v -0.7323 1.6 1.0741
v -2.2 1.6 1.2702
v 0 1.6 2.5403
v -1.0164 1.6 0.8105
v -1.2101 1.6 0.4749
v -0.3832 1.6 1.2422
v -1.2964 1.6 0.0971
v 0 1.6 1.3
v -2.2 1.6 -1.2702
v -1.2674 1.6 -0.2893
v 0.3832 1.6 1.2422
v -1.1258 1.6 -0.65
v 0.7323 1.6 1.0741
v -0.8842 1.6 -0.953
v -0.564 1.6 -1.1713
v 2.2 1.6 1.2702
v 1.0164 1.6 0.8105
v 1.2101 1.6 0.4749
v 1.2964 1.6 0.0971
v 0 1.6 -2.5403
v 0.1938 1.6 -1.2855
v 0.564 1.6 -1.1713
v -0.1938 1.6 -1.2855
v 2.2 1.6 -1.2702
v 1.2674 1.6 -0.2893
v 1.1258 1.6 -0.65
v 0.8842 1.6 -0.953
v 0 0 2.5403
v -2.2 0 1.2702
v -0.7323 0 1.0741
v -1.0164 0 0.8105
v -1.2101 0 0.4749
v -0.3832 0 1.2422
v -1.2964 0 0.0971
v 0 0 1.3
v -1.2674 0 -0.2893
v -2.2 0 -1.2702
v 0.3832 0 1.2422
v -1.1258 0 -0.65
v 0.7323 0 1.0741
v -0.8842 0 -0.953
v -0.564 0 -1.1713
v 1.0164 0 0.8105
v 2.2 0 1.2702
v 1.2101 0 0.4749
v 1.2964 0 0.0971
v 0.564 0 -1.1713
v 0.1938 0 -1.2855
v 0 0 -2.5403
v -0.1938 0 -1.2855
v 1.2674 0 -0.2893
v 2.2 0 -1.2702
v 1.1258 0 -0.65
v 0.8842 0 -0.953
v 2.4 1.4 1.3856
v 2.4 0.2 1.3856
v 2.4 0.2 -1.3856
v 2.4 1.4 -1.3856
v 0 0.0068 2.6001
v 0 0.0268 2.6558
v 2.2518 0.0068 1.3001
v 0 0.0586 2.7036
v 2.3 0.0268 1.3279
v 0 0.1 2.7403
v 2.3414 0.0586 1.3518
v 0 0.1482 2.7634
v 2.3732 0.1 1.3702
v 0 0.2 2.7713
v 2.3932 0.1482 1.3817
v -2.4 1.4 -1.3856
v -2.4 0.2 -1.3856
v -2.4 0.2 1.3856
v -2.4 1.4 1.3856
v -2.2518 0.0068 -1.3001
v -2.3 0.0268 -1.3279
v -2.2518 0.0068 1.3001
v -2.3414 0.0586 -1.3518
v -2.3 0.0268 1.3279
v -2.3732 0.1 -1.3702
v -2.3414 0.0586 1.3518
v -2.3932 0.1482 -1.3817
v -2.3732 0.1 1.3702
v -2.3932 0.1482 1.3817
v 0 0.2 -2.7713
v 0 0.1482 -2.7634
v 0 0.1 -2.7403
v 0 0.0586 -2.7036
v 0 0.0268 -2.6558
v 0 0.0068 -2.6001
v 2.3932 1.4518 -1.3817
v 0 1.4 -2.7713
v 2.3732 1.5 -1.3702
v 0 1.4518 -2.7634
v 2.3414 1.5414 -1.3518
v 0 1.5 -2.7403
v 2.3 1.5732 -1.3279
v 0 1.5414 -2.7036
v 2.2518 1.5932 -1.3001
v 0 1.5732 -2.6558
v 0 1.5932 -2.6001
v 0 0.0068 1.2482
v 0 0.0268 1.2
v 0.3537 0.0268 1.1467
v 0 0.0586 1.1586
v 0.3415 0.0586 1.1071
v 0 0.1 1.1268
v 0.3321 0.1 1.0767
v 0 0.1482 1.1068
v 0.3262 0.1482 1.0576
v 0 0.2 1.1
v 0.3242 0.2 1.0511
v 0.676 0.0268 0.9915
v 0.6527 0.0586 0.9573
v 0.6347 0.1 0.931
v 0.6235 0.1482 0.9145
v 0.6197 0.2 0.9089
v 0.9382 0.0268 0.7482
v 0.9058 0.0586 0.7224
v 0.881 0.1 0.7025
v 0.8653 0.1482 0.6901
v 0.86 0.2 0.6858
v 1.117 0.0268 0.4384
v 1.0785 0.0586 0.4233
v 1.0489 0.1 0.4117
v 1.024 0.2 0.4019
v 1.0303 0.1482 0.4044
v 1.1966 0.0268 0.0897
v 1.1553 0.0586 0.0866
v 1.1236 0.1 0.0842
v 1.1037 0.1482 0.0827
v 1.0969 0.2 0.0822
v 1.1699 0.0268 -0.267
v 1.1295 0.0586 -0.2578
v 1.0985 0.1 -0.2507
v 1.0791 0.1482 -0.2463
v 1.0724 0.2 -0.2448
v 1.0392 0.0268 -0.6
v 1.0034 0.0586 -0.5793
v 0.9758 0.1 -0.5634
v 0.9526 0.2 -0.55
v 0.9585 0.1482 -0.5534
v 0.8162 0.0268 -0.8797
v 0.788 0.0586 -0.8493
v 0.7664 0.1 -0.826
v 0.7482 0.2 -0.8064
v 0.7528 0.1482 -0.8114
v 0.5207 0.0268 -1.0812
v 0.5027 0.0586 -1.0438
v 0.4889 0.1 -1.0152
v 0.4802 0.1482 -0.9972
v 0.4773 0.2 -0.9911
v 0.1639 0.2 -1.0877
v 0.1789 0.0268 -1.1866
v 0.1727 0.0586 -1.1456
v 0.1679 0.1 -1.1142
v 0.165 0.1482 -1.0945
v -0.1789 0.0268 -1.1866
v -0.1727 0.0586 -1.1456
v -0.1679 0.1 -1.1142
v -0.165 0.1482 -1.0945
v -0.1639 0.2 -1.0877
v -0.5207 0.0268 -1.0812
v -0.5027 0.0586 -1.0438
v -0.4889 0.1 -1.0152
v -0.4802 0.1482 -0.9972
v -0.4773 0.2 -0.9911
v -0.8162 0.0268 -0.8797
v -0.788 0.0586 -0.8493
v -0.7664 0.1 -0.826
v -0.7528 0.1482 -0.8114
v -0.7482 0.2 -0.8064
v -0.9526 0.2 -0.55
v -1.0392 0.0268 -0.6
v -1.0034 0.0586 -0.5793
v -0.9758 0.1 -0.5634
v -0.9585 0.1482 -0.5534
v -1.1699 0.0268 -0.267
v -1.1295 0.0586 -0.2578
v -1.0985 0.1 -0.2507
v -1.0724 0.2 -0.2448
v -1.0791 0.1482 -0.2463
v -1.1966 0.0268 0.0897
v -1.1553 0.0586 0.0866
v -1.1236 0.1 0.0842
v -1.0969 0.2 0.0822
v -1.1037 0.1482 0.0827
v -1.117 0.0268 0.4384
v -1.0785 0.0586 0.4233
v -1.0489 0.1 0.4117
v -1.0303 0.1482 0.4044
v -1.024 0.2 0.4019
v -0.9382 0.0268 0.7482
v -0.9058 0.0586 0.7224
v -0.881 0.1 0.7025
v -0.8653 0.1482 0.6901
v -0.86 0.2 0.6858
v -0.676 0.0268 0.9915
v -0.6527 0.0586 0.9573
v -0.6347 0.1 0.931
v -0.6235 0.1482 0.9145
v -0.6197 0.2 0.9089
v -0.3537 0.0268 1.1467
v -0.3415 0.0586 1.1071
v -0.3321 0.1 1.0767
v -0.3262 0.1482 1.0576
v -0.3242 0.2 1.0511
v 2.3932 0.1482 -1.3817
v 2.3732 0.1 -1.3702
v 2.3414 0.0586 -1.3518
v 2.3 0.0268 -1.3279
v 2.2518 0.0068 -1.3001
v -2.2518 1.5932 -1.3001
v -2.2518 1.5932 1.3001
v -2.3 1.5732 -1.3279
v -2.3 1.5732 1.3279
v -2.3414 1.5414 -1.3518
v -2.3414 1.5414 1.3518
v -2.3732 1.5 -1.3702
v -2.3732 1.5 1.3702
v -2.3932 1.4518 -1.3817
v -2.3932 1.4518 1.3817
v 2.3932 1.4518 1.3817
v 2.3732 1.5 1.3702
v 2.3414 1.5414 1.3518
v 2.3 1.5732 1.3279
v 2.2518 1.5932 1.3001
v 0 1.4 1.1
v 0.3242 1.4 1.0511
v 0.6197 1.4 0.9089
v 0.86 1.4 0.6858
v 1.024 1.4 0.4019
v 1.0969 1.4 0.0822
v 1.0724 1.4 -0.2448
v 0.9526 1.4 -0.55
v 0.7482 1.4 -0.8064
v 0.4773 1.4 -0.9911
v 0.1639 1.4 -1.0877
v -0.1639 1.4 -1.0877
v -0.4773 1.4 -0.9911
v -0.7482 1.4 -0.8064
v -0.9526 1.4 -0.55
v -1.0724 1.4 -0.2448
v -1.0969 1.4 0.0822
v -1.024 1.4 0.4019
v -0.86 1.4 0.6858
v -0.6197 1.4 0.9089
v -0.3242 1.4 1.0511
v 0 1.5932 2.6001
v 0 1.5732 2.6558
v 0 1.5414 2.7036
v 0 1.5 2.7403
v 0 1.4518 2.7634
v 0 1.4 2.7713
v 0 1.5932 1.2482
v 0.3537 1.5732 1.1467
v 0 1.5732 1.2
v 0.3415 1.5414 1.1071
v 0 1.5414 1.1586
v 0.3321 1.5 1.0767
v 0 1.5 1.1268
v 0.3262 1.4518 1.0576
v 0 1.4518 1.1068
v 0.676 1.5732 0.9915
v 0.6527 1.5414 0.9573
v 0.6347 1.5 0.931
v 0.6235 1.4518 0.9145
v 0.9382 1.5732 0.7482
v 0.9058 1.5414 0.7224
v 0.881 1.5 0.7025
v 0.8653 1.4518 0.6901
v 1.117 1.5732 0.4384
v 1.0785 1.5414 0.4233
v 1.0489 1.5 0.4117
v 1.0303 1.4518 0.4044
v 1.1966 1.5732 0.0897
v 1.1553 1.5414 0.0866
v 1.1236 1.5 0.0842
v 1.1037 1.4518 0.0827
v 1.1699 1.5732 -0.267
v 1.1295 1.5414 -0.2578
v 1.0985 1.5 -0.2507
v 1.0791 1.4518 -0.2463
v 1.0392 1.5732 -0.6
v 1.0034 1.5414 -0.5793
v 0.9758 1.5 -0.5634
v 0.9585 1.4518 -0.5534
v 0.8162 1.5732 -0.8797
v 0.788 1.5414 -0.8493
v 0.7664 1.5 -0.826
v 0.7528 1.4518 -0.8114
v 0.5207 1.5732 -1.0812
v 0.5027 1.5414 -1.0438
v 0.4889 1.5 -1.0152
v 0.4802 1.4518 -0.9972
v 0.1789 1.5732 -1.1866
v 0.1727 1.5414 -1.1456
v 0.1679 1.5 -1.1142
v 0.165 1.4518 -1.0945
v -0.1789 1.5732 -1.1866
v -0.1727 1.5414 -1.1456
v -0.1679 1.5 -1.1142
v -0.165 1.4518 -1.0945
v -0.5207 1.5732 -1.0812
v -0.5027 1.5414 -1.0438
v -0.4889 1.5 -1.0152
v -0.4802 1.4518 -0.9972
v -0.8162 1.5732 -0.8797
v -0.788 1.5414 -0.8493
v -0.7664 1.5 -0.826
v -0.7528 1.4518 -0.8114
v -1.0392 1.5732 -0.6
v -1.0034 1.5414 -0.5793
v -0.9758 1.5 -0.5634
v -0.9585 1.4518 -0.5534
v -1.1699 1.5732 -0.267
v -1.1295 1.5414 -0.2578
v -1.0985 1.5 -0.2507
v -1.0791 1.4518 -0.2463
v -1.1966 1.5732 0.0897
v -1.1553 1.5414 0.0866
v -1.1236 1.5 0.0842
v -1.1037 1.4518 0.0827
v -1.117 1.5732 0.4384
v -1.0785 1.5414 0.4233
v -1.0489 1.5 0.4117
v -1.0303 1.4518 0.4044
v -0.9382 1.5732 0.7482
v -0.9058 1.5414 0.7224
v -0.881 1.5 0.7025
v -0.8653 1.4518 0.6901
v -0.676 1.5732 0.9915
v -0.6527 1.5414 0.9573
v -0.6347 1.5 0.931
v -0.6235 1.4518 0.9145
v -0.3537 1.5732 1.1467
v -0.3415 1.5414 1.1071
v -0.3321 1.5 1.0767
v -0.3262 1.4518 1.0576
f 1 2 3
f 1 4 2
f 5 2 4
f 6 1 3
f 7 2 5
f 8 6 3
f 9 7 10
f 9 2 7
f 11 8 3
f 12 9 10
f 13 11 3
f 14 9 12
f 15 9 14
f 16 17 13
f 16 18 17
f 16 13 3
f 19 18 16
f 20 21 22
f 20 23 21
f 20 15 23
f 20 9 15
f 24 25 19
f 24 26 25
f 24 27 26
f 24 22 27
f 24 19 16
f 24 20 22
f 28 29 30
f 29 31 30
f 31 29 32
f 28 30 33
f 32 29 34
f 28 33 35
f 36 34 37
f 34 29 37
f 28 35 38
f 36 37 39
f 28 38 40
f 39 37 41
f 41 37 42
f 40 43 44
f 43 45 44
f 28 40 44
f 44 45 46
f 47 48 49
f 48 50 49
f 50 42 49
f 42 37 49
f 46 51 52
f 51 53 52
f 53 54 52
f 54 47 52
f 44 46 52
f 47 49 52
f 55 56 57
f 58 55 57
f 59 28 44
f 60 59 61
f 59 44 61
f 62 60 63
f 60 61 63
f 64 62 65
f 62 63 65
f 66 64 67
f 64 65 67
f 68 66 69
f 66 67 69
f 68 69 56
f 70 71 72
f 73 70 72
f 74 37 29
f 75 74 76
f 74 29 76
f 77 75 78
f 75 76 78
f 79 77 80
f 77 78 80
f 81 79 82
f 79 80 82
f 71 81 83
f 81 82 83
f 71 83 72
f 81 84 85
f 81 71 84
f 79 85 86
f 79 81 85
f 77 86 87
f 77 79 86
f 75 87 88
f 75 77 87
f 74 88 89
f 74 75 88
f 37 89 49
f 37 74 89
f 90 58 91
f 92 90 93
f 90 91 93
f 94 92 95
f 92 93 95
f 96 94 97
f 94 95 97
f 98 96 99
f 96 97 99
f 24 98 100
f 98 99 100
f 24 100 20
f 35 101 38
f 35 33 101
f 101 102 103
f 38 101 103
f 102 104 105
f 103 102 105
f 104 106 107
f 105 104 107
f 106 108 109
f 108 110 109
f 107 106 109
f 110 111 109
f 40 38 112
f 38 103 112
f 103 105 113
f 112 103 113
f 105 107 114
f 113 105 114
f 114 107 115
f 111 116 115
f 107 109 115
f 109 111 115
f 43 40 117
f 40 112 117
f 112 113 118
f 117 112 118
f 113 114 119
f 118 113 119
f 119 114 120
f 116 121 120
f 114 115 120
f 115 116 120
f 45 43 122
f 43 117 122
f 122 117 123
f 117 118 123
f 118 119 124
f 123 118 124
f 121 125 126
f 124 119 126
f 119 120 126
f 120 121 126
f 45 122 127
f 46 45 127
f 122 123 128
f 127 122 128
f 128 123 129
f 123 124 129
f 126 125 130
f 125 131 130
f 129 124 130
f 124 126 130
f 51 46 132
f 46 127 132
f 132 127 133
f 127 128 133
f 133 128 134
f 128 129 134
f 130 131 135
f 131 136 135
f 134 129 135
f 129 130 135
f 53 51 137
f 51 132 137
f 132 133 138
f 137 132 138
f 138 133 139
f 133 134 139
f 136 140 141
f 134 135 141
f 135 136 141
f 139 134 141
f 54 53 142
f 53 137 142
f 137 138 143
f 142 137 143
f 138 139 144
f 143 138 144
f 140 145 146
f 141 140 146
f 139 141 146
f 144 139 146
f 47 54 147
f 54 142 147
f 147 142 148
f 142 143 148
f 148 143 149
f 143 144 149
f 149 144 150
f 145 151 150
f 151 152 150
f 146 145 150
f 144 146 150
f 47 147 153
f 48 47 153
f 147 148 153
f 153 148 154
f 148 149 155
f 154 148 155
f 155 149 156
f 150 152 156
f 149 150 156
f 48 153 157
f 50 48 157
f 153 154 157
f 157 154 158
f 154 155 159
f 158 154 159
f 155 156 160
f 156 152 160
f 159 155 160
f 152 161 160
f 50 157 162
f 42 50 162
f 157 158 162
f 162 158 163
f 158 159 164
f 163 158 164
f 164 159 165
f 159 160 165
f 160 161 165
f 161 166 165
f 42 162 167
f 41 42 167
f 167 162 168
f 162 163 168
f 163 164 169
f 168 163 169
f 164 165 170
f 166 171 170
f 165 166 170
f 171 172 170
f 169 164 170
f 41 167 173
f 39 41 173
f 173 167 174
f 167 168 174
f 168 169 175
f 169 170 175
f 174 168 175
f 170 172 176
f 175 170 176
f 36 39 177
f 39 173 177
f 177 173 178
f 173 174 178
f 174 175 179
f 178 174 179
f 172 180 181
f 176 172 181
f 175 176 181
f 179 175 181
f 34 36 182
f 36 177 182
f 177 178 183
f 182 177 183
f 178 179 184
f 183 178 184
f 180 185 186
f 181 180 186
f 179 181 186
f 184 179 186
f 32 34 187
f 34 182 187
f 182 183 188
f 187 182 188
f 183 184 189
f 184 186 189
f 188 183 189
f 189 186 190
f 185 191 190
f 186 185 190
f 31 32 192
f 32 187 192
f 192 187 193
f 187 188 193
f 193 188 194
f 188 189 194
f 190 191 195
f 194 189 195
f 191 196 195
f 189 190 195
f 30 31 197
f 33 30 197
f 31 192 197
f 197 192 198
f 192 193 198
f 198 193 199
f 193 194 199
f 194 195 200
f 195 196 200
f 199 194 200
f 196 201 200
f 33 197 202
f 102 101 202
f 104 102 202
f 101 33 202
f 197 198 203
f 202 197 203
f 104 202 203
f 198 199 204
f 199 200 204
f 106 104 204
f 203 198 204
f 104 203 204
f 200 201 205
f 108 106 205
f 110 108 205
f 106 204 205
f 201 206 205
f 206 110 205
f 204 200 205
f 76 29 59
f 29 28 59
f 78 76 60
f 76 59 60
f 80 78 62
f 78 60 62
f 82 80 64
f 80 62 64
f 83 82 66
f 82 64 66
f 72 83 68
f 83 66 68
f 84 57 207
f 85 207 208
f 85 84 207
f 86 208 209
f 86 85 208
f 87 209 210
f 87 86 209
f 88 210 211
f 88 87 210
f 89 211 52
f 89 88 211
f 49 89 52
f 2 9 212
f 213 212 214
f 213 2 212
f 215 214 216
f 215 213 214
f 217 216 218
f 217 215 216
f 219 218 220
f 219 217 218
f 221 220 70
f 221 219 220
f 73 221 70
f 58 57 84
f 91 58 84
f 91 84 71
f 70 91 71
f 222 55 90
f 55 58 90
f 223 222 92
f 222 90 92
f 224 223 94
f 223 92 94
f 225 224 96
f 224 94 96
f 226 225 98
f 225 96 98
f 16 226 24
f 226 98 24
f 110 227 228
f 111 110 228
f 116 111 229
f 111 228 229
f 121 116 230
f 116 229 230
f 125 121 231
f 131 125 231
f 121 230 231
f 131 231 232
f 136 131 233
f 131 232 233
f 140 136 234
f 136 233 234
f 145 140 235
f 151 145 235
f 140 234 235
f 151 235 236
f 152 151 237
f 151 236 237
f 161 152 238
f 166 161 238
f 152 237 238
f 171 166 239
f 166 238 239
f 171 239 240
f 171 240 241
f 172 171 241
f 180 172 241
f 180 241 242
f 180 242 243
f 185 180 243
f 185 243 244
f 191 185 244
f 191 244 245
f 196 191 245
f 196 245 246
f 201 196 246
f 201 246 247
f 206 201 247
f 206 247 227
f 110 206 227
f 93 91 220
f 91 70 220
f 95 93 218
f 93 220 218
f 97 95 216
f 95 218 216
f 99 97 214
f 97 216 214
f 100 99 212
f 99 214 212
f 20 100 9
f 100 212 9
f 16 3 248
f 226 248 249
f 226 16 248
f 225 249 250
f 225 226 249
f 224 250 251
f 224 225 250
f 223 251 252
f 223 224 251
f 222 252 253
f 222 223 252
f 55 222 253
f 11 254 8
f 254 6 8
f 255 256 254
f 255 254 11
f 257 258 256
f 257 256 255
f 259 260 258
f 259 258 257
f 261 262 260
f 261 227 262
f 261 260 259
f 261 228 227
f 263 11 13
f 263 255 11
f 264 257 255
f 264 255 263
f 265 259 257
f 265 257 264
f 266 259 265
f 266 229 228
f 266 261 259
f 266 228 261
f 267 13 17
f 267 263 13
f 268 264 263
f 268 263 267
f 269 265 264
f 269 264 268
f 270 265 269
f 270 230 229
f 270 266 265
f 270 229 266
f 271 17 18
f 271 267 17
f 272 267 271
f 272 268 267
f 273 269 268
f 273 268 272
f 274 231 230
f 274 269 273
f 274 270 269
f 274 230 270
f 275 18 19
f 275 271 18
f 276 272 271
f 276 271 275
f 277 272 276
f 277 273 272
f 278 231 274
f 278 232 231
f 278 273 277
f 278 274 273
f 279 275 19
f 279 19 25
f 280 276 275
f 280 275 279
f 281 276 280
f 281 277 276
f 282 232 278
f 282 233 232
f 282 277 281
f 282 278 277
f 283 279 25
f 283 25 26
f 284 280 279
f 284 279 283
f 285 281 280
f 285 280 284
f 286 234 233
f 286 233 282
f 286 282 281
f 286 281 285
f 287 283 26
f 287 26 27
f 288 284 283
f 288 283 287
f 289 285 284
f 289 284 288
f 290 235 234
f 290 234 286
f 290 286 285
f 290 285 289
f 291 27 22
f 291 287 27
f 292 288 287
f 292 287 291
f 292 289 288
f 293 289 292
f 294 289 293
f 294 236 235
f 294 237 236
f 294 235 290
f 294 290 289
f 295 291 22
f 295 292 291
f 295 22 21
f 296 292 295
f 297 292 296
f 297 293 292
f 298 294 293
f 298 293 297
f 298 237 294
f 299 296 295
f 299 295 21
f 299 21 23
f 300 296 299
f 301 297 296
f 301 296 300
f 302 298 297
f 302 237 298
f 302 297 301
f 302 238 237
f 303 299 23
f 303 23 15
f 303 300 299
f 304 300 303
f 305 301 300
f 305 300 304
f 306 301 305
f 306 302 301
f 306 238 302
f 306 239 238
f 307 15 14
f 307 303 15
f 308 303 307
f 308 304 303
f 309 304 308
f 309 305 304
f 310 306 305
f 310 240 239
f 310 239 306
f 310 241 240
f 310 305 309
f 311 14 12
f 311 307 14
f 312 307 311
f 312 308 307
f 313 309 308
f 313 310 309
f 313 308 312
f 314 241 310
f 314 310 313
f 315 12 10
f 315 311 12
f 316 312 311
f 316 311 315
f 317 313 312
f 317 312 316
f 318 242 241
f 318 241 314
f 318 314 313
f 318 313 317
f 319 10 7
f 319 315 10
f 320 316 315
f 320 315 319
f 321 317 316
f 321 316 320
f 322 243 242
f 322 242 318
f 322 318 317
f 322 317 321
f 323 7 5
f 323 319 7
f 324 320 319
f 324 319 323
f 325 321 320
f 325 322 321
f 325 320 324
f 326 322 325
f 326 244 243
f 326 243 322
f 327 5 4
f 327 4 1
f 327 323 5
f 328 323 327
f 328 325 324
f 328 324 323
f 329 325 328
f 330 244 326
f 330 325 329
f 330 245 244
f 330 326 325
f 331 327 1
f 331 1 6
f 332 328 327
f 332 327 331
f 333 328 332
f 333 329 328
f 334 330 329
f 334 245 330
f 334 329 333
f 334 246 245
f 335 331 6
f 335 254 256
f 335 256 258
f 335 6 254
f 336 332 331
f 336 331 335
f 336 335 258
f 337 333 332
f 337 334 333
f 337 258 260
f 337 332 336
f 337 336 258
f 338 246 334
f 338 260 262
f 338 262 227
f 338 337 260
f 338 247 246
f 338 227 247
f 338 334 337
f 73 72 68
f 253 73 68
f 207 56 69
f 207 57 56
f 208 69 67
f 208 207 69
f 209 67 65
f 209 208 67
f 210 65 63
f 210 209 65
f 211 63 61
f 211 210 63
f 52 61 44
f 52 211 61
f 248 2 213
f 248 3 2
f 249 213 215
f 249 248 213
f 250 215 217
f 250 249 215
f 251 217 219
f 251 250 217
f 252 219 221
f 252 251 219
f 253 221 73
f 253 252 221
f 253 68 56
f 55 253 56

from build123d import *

# Parameters (mm, degrees)
BOSS_EXTRUDE1_DEPTH = 1.6
CUT_EXTRUDE1_REACH  = 6
SKETCH2_R           = 1.1
FILLET1_R           = 0.2


with BuildPart() as part:
    # Sketch1 → Boss-Extrude1 (new body)
    with BuildSketch(Plane(origin=(0, 0, 0), x_dir=(1, 0, 0), z_dir=(0, 1, 0))):
        Polygon((2.4, 1.385640646), (0, 2.771281292), (-2.4, 1.385640646), (-2.4, -1.385640646), (0, -2.771281292), (2.4, -1.385640646), align=None)
    extrude(amount=BOSS_EXTRUDE1_DEPTH)

    # Sketch2 → Cut-Extrude1 (cut, up to next)
    with BuildSketch(Plane(origin=(0, 1.6, 0), x_dir=(1, 0, 0), z_dir=(0, 1, 0)), mode=Mode.PRIVATE) as cut_extrude1_sk1:
        with Locations(Location((0, 0, 0), (0, 0, 270))):
            Circle(SKETCH2_R)
    cut_extrude1_tool1 = extrude(cut_extrude1_sk1.sketch, amount=-CUT_EXTRUDE1_REACH, mode=Mode.PRIVATE) & part.part
    add(cut_extrude1_tool1.solids().sort_by_distance((0, 1.6, 0))[0], mode=Mode.SUBTRACT)

    # Fillet1
    fillet1_edges = [part.edges().sort_by_distance(p)[0] for p in [
        (-1.2, 1.6, -2.078460969),
        (-2.4, 1.6, 0),
        (-1.2, 1.6, 2.078460969),
        (0, 1.6, -1.1),
        (0, 0, -1.1),
        (1.2, 1.6, 2.078460969),
        (2.4, 1.6, 0),
        (1.2, 0, 2.078460969),
        (-1.2, 0, 2.078460969),
        (-2.4, 0, 0),
        (-1.2, 0, -2.078460969),
        (1.2, 0, -2.078460969),
        (2.4, 0, 0),
        (1.2, 1.6, -2.078460969),
    ]]
    fillet(fillet1_edges, radius=FILLET1_R)


solid = part.part
